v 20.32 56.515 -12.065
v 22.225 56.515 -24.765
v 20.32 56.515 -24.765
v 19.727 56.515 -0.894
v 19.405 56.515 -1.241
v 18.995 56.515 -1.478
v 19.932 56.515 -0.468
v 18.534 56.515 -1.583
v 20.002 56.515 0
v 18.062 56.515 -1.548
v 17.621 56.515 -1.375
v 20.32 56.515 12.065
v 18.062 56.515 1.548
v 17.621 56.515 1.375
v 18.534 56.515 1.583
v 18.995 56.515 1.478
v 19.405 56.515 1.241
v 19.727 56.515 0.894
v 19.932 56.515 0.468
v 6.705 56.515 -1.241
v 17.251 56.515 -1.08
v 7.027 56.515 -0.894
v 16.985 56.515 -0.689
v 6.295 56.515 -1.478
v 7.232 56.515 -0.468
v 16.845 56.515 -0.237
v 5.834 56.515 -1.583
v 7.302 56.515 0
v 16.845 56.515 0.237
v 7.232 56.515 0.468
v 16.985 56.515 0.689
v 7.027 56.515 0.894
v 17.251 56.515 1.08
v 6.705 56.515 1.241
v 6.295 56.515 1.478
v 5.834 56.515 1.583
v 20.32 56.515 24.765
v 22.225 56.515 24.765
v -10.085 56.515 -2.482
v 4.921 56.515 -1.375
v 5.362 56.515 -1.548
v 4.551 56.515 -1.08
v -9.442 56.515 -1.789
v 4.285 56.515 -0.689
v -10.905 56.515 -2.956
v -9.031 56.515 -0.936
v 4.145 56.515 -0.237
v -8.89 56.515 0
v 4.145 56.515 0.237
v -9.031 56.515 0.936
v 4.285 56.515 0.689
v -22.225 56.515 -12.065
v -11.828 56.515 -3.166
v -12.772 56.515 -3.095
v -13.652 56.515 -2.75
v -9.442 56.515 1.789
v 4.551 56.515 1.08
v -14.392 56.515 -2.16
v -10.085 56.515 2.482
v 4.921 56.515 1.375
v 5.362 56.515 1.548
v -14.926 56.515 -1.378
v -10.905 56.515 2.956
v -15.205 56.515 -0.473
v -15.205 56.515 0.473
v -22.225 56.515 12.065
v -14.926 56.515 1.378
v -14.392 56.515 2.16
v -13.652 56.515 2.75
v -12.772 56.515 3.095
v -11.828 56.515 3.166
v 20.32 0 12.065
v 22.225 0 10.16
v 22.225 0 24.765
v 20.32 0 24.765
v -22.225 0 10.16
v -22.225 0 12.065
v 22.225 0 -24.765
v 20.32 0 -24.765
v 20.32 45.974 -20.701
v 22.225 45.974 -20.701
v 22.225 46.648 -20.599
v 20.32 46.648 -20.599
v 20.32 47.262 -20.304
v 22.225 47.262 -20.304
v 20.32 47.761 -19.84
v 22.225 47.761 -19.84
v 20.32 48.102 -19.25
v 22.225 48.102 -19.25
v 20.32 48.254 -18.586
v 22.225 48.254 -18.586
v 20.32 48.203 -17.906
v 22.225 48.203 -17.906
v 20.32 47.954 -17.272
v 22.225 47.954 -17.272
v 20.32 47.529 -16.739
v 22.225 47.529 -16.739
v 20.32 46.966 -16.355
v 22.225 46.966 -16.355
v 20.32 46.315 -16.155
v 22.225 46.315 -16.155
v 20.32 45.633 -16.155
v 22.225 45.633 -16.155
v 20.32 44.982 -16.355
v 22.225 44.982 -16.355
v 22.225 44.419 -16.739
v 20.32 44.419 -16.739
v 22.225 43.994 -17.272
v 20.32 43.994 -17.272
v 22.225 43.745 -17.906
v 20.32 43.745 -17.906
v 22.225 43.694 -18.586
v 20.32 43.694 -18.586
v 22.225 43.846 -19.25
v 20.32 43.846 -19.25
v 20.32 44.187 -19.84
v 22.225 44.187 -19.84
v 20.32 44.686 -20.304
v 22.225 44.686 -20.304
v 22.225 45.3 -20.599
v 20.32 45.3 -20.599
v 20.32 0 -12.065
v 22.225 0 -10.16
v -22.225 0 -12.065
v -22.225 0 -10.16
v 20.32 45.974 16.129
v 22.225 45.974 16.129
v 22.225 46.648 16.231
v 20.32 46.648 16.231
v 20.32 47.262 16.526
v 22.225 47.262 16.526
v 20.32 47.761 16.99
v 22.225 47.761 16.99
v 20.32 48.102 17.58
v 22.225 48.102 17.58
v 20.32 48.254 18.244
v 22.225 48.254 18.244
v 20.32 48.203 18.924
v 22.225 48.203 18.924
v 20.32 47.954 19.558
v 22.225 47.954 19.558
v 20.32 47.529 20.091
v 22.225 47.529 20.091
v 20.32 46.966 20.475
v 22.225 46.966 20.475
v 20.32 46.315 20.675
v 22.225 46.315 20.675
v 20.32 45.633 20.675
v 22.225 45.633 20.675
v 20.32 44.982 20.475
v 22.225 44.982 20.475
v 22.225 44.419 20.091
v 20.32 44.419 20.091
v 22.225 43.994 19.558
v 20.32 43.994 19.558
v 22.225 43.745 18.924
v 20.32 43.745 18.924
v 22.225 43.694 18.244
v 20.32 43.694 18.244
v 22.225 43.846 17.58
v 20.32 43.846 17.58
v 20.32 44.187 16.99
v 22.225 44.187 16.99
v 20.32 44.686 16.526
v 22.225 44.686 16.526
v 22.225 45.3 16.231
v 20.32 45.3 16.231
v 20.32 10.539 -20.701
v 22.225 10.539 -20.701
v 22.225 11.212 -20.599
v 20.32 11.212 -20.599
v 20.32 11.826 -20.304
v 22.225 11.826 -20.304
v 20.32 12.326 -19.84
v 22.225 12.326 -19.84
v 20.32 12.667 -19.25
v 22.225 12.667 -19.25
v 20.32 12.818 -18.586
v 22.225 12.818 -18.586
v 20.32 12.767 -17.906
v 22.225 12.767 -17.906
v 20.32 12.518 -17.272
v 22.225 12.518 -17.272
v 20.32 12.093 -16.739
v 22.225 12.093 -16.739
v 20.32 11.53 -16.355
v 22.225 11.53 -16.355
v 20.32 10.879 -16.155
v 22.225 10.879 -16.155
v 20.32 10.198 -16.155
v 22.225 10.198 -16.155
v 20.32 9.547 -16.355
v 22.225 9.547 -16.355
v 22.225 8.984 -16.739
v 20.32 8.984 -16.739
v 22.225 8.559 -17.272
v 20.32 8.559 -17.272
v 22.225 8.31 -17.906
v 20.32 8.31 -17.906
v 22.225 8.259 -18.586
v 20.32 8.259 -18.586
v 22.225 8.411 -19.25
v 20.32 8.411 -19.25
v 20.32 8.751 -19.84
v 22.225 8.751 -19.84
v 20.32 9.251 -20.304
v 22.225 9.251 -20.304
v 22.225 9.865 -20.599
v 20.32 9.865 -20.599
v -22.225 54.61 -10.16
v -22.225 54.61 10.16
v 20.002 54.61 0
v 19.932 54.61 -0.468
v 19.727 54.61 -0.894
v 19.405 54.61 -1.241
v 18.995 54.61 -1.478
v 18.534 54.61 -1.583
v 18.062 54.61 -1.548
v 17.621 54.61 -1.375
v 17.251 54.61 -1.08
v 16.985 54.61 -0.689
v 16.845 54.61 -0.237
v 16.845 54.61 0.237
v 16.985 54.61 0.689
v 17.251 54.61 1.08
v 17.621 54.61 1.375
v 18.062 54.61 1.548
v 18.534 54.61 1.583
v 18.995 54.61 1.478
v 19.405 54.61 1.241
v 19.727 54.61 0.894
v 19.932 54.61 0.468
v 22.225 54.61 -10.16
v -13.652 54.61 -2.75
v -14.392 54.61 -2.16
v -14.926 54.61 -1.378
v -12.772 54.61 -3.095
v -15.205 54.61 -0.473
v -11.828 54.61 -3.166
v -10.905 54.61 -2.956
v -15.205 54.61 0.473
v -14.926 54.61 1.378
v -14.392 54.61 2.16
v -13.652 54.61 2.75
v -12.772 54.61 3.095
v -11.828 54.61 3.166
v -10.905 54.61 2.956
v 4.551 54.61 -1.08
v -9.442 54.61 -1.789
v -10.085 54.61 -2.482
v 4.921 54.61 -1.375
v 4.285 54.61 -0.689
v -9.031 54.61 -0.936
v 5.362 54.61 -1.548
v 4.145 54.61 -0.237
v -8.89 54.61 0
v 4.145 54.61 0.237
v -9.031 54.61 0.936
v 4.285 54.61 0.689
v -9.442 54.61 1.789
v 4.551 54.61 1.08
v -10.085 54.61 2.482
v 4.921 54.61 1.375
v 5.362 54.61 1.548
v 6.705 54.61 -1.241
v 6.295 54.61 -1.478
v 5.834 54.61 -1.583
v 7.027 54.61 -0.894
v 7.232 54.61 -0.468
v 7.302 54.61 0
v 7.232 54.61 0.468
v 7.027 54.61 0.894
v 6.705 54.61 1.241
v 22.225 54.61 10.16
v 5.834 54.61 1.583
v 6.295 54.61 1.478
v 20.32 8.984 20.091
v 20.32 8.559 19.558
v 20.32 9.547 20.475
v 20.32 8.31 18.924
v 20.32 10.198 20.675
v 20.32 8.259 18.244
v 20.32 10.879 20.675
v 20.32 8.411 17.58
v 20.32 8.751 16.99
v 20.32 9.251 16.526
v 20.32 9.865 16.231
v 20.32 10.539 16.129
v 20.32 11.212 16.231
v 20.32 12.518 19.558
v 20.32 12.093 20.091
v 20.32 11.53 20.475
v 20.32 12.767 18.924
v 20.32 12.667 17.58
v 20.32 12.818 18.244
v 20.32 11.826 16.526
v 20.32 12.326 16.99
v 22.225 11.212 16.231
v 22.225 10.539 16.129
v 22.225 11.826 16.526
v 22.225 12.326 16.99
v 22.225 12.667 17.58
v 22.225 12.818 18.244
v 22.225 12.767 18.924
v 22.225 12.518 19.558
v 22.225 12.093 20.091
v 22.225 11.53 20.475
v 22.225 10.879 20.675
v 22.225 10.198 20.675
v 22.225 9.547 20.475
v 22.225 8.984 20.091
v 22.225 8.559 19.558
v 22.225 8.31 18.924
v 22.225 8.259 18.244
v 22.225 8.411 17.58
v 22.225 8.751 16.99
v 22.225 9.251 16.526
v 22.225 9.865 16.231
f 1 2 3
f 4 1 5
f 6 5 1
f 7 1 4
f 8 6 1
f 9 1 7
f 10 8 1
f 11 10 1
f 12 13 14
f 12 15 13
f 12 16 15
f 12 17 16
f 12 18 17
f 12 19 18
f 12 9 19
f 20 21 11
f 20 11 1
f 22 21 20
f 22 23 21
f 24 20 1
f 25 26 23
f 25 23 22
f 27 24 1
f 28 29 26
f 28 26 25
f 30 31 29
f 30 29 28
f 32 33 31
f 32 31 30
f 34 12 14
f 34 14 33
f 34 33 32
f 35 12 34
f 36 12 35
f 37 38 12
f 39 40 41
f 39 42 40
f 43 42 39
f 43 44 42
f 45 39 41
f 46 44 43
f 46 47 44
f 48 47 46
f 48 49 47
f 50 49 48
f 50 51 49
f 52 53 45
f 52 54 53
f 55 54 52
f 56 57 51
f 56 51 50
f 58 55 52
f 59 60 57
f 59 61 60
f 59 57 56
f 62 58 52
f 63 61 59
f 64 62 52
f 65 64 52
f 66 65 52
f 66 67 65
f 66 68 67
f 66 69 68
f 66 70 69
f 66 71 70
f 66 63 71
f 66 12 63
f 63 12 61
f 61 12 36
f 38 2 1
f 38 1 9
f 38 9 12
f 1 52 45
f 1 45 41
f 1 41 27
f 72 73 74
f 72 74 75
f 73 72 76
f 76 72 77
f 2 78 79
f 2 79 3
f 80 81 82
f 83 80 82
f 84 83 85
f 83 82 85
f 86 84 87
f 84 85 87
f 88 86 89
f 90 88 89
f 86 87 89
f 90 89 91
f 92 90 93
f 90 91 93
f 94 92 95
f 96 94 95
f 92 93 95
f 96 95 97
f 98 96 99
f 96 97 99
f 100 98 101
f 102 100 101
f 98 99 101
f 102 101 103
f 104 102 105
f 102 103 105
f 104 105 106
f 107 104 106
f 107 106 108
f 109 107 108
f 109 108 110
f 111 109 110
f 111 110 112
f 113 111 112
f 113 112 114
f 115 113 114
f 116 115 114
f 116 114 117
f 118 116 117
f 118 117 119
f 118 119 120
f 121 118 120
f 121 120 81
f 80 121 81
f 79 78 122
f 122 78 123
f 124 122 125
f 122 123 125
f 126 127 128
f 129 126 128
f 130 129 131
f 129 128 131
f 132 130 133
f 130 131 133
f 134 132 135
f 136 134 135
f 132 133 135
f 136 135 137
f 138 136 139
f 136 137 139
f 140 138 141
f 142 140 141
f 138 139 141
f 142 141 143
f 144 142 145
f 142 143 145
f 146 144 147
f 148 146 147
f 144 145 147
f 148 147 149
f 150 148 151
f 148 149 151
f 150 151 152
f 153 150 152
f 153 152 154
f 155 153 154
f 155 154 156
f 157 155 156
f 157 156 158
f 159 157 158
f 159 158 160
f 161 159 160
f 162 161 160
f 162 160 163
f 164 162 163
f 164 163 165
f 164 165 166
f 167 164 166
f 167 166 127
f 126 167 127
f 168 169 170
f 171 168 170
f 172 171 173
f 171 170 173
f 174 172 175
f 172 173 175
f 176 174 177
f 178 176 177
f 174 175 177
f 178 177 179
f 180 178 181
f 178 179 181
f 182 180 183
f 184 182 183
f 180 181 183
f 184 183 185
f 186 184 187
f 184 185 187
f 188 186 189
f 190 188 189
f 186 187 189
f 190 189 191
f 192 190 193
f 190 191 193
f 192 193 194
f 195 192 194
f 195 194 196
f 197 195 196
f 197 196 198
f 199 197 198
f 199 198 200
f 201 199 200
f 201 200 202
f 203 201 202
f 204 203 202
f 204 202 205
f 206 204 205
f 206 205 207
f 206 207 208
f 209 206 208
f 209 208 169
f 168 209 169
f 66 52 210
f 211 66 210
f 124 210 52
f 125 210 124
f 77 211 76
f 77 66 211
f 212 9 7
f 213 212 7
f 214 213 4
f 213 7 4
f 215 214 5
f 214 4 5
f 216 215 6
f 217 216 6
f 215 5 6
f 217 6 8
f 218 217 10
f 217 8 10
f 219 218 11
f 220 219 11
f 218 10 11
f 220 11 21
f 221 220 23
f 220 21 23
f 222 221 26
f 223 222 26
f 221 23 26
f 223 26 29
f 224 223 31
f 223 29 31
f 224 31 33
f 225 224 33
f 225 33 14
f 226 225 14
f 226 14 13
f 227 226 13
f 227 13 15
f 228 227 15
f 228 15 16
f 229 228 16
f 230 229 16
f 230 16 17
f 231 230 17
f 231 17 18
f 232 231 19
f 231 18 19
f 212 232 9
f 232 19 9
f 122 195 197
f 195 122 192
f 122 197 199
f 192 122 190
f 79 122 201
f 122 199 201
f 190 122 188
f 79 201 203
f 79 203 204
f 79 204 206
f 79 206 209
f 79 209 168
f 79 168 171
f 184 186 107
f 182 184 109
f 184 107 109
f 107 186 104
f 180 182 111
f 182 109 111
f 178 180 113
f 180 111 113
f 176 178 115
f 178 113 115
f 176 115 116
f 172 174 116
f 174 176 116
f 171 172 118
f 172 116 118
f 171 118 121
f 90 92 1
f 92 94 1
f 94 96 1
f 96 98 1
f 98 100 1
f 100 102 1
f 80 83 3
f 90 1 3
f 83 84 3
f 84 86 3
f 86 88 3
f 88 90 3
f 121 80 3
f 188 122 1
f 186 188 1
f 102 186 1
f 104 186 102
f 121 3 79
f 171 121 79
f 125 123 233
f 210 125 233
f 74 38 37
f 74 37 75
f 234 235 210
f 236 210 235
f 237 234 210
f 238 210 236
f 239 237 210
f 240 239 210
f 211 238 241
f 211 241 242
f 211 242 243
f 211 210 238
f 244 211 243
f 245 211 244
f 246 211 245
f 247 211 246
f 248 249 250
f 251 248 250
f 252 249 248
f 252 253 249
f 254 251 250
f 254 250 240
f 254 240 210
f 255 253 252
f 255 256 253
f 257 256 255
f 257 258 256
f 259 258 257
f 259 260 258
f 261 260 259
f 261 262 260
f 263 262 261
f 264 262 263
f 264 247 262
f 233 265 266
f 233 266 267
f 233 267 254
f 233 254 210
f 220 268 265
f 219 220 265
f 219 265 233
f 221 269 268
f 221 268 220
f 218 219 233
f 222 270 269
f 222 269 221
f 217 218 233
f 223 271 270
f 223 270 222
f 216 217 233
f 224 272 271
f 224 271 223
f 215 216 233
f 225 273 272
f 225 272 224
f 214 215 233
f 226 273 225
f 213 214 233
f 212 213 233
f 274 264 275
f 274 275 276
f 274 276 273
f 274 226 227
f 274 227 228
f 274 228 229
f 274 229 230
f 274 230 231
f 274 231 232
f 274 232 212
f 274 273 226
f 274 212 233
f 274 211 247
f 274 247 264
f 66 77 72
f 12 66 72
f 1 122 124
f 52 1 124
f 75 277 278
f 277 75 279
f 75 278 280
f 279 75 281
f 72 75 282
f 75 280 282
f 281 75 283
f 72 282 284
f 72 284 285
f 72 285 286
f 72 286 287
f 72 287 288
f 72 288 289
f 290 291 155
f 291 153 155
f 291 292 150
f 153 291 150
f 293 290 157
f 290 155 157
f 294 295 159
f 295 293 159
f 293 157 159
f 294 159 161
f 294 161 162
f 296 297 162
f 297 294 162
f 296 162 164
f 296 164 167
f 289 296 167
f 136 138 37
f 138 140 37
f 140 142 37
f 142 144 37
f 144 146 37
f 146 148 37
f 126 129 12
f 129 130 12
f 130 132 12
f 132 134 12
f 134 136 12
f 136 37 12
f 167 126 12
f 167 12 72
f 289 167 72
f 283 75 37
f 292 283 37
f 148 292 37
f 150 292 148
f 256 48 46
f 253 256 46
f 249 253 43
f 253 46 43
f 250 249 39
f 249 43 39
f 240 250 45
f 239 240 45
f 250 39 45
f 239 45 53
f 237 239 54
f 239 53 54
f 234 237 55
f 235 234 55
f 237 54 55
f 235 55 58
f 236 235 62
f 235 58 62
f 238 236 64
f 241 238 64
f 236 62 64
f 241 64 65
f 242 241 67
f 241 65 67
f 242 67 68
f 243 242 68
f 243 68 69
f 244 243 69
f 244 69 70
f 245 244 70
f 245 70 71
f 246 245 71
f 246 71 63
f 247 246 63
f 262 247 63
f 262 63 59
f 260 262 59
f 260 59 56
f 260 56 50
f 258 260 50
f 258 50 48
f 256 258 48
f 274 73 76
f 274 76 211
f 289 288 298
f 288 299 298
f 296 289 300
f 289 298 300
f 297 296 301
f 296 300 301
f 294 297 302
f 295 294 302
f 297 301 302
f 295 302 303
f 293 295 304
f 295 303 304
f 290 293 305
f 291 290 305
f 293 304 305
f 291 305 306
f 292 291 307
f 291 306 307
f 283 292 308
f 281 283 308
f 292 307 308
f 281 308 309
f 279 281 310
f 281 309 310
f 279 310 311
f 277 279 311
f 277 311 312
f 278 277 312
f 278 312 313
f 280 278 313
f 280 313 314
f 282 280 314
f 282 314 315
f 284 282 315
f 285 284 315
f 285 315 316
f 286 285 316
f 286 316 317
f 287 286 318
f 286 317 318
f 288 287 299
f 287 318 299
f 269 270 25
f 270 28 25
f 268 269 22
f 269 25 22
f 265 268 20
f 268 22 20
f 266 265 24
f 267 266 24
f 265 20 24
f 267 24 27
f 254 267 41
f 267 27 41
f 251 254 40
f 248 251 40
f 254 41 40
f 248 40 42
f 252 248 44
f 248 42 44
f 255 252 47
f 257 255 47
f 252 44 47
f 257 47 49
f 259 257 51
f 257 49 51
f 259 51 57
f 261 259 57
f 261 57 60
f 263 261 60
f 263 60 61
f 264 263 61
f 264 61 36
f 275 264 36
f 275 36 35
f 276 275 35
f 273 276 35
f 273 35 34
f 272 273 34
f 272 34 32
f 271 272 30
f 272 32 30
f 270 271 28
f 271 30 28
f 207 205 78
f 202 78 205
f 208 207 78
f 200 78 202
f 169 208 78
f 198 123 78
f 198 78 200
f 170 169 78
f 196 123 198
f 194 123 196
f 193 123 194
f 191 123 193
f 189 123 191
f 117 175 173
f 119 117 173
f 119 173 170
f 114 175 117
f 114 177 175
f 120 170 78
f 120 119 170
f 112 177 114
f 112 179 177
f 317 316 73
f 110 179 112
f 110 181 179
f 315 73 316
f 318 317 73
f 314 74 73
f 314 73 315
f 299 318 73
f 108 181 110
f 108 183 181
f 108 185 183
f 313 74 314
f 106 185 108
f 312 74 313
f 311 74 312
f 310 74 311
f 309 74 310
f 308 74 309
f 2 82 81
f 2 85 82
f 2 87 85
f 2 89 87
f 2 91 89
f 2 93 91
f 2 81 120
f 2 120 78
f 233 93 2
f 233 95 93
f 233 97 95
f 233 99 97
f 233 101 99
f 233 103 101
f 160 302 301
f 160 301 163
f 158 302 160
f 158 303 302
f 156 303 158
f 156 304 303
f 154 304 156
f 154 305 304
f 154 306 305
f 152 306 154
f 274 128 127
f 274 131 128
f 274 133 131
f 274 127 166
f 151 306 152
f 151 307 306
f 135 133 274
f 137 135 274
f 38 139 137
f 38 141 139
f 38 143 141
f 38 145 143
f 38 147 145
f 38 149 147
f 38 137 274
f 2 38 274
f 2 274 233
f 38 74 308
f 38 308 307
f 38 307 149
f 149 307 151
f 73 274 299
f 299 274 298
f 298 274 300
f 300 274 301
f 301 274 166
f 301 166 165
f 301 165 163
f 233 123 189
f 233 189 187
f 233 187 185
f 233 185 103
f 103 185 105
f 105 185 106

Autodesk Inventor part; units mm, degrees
ref_plane "YZ Plane" through (0, 0, 0) normal (1, 0, 0) x (0, 1, 0)
ref_plane "XZ Plane" through (0, 0, 0) normal (0, 1, 0) x (-1, 0, 0)
ref_plane "XY Plane" through (0, 0, 0) normal (0, 0, 1) x (1, 0, 0)
sketch "Sketch1" plane through (0, 0, 0) normal (0, 1, 0) x (-1, 0, 0)
  line L0 (20.32, 10.16) -> (-20.32, 10.16)
  line L1 (-20.32, 10.16) -> (-20.32, -10.16)
  line L2 (-20.32, -10.16) -> (20.32, -10.16)
  line L3 (20.32, -10.16) -> (20.32, 10.16)
  line L4 (22.225, 12.065) -> (-22.225, 12.065)
  line L5 (-22.225, 12.065) -> (-22.225, -12.065)
  line L6 (-22.225, -12.065) -> (22.225, -12.065)
  line L7 (22.225, -12.065) -> (22.225, 12.065)
  point P0 (0, 0)
  dimension "d0" = 40.64
  dimension "d1" = 20.32
  dimension "d2" = 40.64
  dimension "d3" = 44.45
  dimension "d4" = 24.13
  dimension "d5" = 44.45
extrude "Extrusion1" add sketch "Sketch1" along normal blind 56.515
sketch "Sketch2" plane through (-20.32, 0, -10.16) normal (1, 0, 0) x (0, 0, -1)
  line L0 (0, 0) -> (-20.32, 0) projected
  line L1 (0, 0) -> (0, 56.515) projected
  line L2 (-20.32, 56.515) -> (0, 56.515) projected
  line L3 (-20.32, 0) -> (-20.32, 56.515) projected
  point P0 (-10.16, 0)
extrude "Extrusion2" cut sketch "Sketch2" against normal blind 56.515
sketch "Sketch3" plane through (20.32, 0, 10.16) normal (-1, 0, 0) x (0, 0, 1)
  line L0 (0, 0) -> (-20.32, 0) projected
  line L1 (0, 0) -> (0, 56.515) projected
  line L2 (-20.32, 56.515) -> (0, 56.515) projected
  line L3 (-20.32, 0) -> (-20.32, 56.515) projected
  point P0 (-10.16, 0)
extrude "Extrusion3" cut sketch "Sketch3" against normal blind 56.515
sketch "Sketch4" plane through (22.225, 0, 10.16) normal (0, 0, -1) x (-1, 0, 0)
  line L0 (44.45, 56.515) -> (44.45, 0) projected
  line L1 (0, 56.515) -> (44.45, 56.515) projected
  line L2 (0, 0) -> (0, 56.515) projected
  line L3 (44.45, 54.61) -> (0, 54.61)
  point P0 (22.225, 0)
extrude "Extrusion4" add sketch "Sketch4" along normal blind 20.32
sketch "Sketch7" plane through (0, 56.515, 0) normal (0, 1, 0) x (1, 0, 0)
  circle A0 centre (18.415, 0) radius 1.5875
  circle A1 centre (5.715, 0) radius 1.5875
  circle A2 centre (-12.065, 0) radius 3.175
  point P0 (0, 0)
  dimension "d18" = 3.175
  dimension "d19" = 3.175
  dimension "d20" = 6.35
extrude "Extrusion7" cut sketch "Sketch7" against normal blind 15.24
sketch "Sketch10" plane through (0, 56.515, 0) normal (0, 1, 0) x (1, 0, 0)
  circle A0 centre (-12.065, 0) radius 3.175 projected
  line L0 (-22.225, 12.065) -> (-22.225, -12.065) projected
  line L1 (-22.225, -12.065) -> (22.225, -12.065) projected
  line L2 (22.225, 12.065) -> (-22.225, 12.065) projected
  line L3 (1.905, 12.065) -> (1.905, -12.065)
  point P0 (0, 0)
extrude "Extrusion10" cut sketch "Sketch10" along normal blind 19.05
sketch "Sketch11" plane through (22.225, 0, 10.16) normal (1, 0, 0) x (0, 0, -1)
  line L0 (0, 0) -> (0, 54.61) projected
  line L1 (0, 54.61) -> (20.32, 54.61) projected
  line L2 (20.32, 54.61) -> (20.32, 0) projected
  line L3 (20.32, 0) -> (22.225, 0) projected
  line L4 (22.225, 0) -> (22.225, 56.515) projected
  line L5 (-1.905, 56.515) -> (22.225, 56.515) projected
  line L6 (-1.905, 0) -> (-1.905, 56.515) projected
  line L7 (-1.905, 0) -> (0, 0) projected
  line L8 (-1.905, 0) -> (-1.905, 56.515)
  line L9 (-1.905, 56.515) -> (-14.605, 56.515)
  line L10 (-14.605, 56.515) -> (-14.605, 0)
  line L11 (-14.605, 0) -> (-1.905, 0)
  line L12 (22.225, 0) -> (34.925, 0)
  line L13 (34.925, 0) -> (34.925, 56.515)
  line L14 (34.925, 56.515) -> (22.225, 56.515)
  line L15 (22.225, 0) -> (22.225, 56.515)
  line L16 (22.225, 0) -> (22.225, 56.515) projected
  line L17 (-14.605, 56.515) -> (-8.255, 56.515)
  circle A0 centre (-8.255, 10.5386) radius 2.286
  circle A1 centre (-8.255, 45.974) radius 2.286
  circle A2 centre (28.575, 45.974) radius 2.286
  circle A3 centre (28.575, 10.5386) radius 2.286
  point P0 (10.16, 0)
  dimension "d38" = 12.7
  dimension "d39" = 12.7
  dimension "d42" = 4.572
  dimension "d44" = 4.572
  dimension "d45" = 4.572
  dimension "d46" = 4.572
extrude "Extrusion11" add sketch "Sketch11" against normal blind 1.905 contours L11 L10 L9 L6 | L14 L13 L12 L4 | A0 | A1 | A2 | A3
extrude "Extrusion12" cut sketch "Sketch11" against normal blind 6.35 contours A0 | A1 | A2 | A3
properties part number "Autonomous - Ultrasonic Servo Mount V2"
